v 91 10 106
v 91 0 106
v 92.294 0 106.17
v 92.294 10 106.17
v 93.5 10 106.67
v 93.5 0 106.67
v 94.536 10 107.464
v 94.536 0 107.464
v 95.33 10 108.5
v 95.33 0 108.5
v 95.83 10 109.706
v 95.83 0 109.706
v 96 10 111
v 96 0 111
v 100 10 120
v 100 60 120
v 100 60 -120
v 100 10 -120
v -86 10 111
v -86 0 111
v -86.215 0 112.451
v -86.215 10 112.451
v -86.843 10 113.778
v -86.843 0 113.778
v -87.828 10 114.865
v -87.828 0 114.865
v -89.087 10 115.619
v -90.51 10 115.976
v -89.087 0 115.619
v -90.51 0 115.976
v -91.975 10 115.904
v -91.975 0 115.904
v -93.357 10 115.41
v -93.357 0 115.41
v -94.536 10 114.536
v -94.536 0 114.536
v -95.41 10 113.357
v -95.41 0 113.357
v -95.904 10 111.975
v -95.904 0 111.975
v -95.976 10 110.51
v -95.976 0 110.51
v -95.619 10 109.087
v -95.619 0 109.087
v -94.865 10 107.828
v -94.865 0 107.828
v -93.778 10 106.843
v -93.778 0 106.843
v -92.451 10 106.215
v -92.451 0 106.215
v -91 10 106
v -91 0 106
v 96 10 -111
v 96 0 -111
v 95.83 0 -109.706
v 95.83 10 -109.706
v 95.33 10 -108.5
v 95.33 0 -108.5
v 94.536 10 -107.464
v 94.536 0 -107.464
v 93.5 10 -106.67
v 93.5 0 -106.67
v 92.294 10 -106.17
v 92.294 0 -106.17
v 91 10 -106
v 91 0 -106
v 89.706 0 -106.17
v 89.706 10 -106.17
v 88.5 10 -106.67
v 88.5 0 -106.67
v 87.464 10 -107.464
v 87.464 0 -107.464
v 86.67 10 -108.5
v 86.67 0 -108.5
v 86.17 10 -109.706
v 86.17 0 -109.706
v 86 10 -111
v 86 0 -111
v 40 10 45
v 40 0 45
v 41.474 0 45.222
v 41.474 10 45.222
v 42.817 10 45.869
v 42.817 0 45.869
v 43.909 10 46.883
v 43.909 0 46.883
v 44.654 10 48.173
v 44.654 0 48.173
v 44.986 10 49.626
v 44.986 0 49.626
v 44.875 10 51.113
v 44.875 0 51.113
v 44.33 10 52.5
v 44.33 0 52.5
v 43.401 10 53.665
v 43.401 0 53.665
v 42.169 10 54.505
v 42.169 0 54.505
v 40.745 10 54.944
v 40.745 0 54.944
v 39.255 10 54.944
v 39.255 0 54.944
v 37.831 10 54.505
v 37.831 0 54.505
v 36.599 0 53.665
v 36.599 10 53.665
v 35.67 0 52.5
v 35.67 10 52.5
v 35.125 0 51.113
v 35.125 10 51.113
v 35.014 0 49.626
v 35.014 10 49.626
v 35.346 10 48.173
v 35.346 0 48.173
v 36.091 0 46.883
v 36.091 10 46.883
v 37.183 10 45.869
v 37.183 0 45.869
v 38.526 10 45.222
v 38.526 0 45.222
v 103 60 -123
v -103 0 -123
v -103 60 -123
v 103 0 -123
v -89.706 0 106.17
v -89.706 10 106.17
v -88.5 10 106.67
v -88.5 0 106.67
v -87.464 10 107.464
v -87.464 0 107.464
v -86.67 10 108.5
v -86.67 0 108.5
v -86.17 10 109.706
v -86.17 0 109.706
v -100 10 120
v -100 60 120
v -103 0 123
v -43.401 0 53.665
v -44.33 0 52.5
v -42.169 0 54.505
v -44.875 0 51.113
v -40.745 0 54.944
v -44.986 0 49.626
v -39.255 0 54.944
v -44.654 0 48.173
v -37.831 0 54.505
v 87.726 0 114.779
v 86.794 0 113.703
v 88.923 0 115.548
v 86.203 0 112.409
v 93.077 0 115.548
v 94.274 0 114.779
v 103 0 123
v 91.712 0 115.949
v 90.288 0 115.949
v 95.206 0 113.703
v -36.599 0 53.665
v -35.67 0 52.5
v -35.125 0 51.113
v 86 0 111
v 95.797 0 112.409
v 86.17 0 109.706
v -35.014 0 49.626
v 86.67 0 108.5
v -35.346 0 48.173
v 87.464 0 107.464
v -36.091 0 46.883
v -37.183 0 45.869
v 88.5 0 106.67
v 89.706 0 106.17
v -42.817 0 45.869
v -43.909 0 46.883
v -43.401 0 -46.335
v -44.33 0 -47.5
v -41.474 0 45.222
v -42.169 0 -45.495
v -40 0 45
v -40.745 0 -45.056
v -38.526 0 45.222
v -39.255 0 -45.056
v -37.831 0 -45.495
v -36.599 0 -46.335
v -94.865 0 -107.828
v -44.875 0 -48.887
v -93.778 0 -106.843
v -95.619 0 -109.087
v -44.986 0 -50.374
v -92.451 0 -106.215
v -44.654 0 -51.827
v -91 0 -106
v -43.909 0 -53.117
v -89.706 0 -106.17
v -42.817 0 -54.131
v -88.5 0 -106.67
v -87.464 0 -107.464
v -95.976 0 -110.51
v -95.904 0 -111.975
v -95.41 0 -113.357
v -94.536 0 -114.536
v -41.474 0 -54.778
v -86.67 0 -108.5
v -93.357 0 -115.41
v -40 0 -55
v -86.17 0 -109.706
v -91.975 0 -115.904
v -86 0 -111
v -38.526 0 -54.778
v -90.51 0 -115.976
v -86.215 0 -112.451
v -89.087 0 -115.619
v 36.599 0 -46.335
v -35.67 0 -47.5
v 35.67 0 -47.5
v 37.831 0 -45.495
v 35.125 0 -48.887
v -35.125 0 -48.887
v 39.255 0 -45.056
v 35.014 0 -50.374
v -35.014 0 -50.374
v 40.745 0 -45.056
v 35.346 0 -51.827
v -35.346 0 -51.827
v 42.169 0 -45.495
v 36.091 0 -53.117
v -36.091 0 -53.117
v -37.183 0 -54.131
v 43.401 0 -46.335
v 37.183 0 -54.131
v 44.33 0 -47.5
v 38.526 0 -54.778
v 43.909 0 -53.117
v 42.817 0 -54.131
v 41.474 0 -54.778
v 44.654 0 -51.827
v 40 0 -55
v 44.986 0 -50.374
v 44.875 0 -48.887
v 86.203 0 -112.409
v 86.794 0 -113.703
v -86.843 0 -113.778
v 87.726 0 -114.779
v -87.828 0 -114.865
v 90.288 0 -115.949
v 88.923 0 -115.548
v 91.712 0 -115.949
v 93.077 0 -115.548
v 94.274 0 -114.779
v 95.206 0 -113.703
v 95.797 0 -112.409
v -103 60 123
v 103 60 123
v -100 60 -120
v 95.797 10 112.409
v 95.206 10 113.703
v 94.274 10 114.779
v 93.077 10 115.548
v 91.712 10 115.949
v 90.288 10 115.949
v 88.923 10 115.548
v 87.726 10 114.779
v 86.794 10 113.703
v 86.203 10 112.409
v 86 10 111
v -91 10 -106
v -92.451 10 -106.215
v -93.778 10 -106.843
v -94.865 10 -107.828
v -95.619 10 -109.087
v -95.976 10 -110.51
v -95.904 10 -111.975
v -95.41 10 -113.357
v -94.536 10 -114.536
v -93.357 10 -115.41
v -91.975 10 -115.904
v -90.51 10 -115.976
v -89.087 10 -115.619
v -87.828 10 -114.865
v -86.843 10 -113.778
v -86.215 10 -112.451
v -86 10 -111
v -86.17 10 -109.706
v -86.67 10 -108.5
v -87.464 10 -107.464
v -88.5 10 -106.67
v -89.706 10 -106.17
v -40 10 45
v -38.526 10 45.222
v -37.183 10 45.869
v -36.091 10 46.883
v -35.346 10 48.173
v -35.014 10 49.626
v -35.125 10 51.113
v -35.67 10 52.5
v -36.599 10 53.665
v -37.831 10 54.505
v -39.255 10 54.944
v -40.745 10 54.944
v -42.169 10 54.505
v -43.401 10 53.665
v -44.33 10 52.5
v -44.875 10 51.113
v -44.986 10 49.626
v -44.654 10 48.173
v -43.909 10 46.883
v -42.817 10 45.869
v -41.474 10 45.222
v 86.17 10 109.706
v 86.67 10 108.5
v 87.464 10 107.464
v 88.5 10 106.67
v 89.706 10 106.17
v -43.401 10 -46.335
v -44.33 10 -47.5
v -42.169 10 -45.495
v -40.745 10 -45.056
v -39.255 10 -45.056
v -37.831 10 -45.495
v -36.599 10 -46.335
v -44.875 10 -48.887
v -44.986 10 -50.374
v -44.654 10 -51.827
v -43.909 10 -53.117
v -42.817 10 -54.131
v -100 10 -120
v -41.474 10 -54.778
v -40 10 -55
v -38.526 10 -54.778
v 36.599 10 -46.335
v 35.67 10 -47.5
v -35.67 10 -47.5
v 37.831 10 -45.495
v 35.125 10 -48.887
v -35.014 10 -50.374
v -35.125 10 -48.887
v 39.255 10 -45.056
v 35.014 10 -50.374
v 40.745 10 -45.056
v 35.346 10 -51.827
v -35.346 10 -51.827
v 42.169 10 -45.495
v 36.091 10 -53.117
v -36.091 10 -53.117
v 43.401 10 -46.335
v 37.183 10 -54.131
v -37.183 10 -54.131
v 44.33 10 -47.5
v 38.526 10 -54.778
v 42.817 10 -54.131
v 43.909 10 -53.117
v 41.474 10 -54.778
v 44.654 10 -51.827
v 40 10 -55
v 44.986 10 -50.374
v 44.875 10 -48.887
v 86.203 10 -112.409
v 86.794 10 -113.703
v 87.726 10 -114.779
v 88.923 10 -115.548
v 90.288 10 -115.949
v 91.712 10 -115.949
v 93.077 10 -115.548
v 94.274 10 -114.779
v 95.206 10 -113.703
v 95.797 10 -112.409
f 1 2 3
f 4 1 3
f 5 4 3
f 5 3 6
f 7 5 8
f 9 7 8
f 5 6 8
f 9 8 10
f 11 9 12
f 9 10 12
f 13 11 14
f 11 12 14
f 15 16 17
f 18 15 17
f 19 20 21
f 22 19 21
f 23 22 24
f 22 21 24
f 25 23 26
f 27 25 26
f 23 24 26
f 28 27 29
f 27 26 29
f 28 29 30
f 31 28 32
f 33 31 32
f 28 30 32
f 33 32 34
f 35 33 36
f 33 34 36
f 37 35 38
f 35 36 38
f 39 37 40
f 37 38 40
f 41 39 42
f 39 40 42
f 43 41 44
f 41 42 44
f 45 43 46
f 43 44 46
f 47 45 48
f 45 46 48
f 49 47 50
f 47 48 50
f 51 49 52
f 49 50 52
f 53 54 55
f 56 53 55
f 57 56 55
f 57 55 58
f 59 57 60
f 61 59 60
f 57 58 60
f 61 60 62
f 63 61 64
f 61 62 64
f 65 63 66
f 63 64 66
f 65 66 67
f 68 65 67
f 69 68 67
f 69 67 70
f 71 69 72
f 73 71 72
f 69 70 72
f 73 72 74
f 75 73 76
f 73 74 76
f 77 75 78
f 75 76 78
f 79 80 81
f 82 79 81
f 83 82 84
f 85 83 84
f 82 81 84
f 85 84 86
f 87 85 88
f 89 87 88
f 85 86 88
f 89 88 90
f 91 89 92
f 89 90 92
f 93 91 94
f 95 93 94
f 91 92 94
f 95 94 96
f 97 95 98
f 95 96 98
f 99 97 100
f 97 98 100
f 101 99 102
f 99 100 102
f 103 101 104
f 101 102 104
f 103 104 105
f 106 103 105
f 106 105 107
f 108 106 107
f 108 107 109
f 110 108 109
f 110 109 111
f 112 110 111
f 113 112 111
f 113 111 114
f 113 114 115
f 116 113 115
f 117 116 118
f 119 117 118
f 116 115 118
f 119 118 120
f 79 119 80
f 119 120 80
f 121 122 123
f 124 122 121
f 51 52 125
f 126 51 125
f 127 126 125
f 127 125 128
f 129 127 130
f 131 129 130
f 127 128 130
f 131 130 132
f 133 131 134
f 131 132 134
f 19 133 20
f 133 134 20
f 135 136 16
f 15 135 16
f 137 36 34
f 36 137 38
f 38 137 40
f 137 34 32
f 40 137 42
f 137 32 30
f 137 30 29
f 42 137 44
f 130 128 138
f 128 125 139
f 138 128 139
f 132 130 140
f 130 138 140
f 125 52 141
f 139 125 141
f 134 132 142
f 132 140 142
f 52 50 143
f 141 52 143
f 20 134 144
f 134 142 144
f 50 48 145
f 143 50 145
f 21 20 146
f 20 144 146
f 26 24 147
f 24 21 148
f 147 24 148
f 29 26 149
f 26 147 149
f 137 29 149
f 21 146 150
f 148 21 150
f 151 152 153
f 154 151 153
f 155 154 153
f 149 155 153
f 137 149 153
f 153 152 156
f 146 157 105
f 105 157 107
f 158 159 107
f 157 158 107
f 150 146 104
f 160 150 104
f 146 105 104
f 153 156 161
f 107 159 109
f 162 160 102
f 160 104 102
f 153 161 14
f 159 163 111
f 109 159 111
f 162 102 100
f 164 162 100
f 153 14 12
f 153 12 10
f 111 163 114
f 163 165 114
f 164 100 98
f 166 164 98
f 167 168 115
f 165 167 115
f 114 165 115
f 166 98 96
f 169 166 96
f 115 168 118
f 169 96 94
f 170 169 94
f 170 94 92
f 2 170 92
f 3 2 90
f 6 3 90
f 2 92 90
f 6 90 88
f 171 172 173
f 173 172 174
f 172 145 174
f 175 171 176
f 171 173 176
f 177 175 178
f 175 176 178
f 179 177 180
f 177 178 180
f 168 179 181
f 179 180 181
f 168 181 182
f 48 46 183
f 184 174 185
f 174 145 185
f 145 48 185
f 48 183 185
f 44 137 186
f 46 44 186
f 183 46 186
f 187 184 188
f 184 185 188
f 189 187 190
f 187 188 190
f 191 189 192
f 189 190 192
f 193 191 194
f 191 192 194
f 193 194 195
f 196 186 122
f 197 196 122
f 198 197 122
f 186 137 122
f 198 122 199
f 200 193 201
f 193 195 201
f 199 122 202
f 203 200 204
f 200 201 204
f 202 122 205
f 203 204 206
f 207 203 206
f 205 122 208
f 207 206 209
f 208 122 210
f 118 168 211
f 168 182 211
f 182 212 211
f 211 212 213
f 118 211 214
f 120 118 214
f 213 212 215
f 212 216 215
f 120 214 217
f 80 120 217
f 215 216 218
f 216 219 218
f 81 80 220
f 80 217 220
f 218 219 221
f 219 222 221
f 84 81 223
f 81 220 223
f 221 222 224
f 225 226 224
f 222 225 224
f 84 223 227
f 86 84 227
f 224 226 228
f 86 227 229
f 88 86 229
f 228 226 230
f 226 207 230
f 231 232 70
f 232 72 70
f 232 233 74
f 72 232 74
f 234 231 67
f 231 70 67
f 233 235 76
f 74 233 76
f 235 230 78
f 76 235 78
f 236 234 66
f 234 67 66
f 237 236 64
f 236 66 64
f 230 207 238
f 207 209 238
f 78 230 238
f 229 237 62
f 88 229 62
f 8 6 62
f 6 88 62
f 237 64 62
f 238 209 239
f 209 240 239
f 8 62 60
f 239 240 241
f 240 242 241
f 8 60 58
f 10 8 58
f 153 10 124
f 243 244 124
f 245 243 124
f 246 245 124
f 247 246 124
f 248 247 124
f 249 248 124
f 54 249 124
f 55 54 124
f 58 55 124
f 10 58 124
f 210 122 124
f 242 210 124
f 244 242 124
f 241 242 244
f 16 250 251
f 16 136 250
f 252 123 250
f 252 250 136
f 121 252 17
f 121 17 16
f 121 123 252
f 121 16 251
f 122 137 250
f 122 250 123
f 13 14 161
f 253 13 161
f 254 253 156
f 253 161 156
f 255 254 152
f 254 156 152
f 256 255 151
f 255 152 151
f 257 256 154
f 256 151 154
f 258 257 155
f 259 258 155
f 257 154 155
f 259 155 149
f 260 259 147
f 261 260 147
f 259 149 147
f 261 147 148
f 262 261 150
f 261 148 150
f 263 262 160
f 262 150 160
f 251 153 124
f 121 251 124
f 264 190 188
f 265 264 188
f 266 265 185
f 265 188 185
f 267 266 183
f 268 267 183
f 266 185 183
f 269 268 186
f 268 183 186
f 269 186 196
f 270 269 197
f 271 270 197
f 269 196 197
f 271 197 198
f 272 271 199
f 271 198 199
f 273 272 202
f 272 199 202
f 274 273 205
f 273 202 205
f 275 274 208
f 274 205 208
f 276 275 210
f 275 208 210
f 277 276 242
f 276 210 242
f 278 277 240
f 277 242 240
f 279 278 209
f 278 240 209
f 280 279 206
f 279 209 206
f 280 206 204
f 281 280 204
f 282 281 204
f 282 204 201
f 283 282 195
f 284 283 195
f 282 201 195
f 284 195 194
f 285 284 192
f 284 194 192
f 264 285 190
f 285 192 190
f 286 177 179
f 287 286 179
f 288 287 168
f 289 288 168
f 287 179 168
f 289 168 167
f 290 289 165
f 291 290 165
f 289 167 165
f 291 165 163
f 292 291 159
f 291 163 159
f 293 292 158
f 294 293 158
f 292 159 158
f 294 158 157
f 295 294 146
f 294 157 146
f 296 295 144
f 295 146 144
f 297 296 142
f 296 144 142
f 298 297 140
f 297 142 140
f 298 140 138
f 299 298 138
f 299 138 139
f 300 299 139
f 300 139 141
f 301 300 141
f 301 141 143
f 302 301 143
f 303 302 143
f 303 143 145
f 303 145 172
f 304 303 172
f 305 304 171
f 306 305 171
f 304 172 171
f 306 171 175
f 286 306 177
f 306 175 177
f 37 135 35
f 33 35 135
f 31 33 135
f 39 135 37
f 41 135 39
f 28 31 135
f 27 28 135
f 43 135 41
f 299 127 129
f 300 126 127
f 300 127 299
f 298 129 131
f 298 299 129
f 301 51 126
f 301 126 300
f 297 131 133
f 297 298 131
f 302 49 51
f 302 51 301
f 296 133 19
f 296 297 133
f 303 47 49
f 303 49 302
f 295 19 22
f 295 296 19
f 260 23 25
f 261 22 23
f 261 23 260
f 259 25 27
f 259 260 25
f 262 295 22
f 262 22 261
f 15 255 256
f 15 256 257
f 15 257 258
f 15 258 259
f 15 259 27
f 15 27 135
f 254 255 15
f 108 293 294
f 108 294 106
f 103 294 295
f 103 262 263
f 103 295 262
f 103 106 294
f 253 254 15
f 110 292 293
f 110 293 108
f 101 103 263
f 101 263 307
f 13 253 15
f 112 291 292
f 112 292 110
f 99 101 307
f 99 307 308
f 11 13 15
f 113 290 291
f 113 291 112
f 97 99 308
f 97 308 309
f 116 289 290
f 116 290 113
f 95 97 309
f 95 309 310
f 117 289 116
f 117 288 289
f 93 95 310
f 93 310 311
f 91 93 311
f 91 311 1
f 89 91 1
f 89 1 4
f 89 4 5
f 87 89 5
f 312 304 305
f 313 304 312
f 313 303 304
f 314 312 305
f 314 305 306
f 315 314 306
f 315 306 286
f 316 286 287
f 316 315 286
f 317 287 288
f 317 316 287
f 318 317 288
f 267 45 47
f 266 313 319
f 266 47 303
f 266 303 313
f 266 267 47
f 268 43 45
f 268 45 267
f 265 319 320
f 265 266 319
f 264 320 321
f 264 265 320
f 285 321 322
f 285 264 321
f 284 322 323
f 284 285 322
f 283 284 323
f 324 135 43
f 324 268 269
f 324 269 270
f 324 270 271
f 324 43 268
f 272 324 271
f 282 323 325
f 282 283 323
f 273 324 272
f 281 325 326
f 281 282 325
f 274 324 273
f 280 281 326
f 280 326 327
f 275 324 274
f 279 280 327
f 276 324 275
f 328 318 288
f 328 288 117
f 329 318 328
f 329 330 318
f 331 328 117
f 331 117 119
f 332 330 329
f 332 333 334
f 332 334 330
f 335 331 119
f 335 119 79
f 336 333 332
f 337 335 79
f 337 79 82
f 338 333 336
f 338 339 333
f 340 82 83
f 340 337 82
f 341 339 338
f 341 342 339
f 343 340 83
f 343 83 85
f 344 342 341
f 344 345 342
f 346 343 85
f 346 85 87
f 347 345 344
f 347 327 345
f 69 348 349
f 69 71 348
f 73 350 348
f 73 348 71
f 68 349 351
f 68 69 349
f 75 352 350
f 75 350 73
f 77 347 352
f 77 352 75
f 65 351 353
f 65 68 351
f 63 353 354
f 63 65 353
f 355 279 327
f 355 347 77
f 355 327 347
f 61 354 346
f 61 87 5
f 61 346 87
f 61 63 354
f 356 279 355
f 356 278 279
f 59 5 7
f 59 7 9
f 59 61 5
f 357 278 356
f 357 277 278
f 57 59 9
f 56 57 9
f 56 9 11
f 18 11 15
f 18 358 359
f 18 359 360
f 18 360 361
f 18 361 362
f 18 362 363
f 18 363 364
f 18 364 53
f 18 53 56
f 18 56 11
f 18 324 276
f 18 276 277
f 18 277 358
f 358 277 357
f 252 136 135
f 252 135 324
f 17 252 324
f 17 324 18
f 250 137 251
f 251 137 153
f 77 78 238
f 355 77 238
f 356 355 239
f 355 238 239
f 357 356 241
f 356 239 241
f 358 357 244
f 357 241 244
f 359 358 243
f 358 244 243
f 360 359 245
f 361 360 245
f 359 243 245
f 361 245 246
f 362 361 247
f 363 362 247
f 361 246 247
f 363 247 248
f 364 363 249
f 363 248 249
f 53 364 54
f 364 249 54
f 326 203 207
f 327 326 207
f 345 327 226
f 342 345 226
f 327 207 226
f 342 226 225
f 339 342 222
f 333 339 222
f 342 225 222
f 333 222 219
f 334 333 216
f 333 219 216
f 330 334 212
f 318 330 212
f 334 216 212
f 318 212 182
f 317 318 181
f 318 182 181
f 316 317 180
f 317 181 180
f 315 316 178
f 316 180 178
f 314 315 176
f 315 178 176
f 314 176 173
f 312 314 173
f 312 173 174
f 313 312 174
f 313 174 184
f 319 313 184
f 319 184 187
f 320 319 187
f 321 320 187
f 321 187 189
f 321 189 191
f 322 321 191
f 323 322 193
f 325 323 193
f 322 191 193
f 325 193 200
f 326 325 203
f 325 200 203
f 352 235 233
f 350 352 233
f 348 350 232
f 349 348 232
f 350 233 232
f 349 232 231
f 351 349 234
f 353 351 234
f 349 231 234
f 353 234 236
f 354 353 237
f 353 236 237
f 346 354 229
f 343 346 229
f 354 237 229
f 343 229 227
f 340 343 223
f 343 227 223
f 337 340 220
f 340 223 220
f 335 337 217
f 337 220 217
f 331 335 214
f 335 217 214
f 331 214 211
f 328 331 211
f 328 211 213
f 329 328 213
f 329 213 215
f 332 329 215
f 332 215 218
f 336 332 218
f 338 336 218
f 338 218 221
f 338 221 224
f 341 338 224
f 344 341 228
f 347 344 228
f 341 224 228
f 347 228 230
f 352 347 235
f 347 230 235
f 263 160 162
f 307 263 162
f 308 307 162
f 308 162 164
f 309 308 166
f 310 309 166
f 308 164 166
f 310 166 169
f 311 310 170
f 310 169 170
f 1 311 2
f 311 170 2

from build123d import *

# Parameters (mm, degrees)
SKETCH1_W           = 206
SKETCH1_H           = 246
BOSS_EXTRUDE1_DEPTH = 60
SKETCH2_W           = 200
SKETCH2_H           = 240
CUT_EXTRUDE1_DEPTH  = 50
CUT_EXTRUDE3_DEPTH  = 172.283390905
SKETCH4_R           = 5
CUT_EXTRUDE4_DEPTH  = 10


with BuildPart() as part:
    # Sketch1 → Boss-Extrude1 (new body)
    with BuildSketch(Plane(origin=(0, 0, 0), x_dir=(1, 0, 0), z_dir=(0, 1, 0))):
        Rectangle(SKETCH1_W, SKETCH1_H)
    extrude(amount=BOSS_EXTRUDE1_DEPTH)

    # Sketch2 → Cut-Extrude1 (cut)
    with BuildSketch(Plane(origin=(0, 60, 0), x_dir=(1, 0, 0), z_dir=(0, 1, 0))):
        Rectangle(SKETCH2_W, SKETCH2_H)
    extrude(amount=-CUT_EXTRUDE1_DEPTH, mode=Mode.SUBTRACT)

    # Sketch3 → Cut-Extrude3 (cut, through all)
    with BuildSketch(Plane.XZ):
        with BuildLine():
            Line((-91, 106), (-91, 111))
            Line((-91, 111), (-86, 111))
            ThreePointArc((-86, 111), (-94.535533906, 114.535533906), (-91, 106))
        make_face()
        with BuildLine():
            Line((-86, 111), (-91, 111))
            Line((-91, 111), (-91, 106))
            ThreePointArc((-91, 106), (-87.464466094, 107.464466094), (-86, 111))
        make_face()
        with BuildLine():
            ThreePointArc((96, 111), (91, 116), (86, 111))
            Line((86, 111), (91, 111))
            Line((91, 111), (91, 106))
            ThreePointArc((91, 106), (94.535533906, 107.464466094), (96, 111))
        make_face()
        with BuildLine():
            Line((91, 111), (86, 111))
            ThreePointArc((86, 111), (87.464466094, 107.464466094), (91, 106))
            Line((91, 106), (91, 111))
        make_face()
        with BuildLine():
            ThreePointArc((96, -111), (94.535533906, -107.464466094), (91, -106))
            Line((91, -106), (91, -111))
            Line((91, -111), (86, -111))
            ThreePointArc((86, -111), (91, -116), (96, -111))
        make_face()
        with BuildLine():
            Line((91, -111), (91, -106))
            ThreePointArc((91, -106), (87.464466094, -107.464466094), (86, -111))
            Line((86, -111), (91, -111))
        make_face()
        with BuildLine():
            ThreePointArc((-86, -111), (-87.464466094, -107.464466094), (-91, -106))
            Line((-91, -106), (-91, -111))
            Line((-91, -111), (-86, -111))
        make_face()
        with BuildLine():
            Line((-91, -111), (-91, -106))
            ThreePointArc((-91, -106), (-94.535533906, -114.535533906), (-86, -111))
            Line((-86, -111), (-91, -111))
        make_face()
    extrude(amount=-CUT_EXTRUDE3_DEPTH, mode=Mode.SUBTRACT)

    # Sketch4 → Cut-Extrude4 (cut)
    with BuildSketch(Plane.XZ):
        with Locations(Location((40, -50, 0), (0, 0, 270))):
            Circle(SKETCH4_R)
        with Locations(Location((-40, -50, 0), (0, 0, 270))):
            Circle(SKETCH4_R)
        with Locations(Location((-40, 50, 0), (0, 0, 270))):
            Circle(SKETCH4_R)
        with Locations(Location((40, 50, 0), (0, 0, 270))):
            Circle(SKETCH4_R)
    extrude(amount=-CUT_EXTRUDE4_DEPTH, mode=Mode.SUBTRACT)


solid = part.part
